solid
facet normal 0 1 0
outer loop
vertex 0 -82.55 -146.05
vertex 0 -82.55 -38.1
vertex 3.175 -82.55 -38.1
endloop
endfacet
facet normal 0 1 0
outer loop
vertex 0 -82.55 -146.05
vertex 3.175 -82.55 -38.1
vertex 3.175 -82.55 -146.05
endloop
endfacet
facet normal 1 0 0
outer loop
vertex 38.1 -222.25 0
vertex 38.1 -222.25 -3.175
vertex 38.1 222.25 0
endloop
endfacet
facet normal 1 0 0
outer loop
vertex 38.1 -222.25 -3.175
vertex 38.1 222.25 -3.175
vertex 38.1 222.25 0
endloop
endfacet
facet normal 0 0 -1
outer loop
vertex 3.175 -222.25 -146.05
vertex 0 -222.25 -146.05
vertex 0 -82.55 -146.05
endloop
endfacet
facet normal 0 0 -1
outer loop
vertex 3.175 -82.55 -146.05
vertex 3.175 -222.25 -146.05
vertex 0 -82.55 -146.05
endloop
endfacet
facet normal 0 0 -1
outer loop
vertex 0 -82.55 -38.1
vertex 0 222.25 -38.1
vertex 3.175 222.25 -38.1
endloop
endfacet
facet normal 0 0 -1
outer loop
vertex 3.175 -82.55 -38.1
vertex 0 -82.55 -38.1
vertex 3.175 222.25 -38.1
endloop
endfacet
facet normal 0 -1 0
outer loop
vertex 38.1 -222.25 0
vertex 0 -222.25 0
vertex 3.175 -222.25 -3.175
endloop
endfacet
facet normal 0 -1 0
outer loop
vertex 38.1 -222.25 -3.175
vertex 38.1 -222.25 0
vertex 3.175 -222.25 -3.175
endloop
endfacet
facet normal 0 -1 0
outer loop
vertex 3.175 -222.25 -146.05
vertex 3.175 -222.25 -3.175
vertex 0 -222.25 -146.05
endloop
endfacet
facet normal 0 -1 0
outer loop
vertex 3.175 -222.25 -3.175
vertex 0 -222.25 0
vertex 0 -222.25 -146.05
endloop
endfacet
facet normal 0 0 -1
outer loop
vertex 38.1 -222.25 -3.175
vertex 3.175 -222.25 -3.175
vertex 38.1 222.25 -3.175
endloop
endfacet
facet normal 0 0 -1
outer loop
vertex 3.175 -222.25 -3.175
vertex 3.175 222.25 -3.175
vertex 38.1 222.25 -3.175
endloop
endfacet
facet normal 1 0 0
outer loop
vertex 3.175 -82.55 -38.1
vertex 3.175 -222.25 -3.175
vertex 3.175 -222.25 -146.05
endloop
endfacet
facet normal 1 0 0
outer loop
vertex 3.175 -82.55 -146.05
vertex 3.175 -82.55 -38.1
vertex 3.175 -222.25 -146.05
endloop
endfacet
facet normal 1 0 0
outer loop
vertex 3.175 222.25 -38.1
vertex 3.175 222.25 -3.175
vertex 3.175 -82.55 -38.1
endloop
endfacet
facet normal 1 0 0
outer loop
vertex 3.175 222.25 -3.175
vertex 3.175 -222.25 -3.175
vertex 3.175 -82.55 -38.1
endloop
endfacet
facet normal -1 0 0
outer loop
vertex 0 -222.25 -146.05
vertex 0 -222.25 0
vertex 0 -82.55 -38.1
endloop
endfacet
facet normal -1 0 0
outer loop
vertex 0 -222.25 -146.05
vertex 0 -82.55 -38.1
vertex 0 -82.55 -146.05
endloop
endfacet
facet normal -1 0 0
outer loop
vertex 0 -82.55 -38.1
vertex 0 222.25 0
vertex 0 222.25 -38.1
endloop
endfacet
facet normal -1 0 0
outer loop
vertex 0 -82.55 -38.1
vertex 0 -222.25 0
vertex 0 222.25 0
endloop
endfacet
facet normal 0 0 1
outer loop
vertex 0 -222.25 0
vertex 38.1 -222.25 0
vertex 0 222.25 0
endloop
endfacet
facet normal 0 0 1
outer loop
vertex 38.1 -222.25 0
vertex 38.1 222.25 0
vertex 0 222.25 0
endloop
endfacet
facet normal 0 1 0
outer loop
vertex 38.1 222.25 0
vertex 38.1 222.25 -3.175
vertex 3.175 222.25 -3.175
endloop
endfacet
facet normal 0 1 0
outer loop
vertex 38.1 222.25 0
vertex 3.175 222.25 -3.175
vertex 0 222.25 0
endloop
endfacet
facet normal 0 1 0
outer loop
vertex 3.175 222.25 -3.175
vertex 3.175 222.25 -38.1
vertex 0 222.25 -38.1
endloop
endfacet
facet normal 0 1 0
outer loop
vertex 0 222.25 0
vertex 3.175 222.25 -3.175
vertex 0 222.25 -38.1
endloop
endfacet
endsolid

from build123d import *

# Parameters (mm, degrees)
BOSS_EXTRUDE1_DEPTH = 222.25
SKETCH19_W          = 107.95
SKETCH19_H          = 139.7
BOSS_EXTRUDE2_DEPTH = 3.175


with BuildPart() as part:
    # Sketch18 → Boss-Extrude1 (new, symmetric)
    with BuildSketch(Plane(origin=(0, 0, 0), x_dir=(1, 0, 0), z_dir=(0, 1, 0))):
        Polygon((3.175, 38.1), (3.175, 3.175), (38.1, 3.175), (38.1, 0), (0, 0), (0, 38.1), align=None)
    extrude(amount=BOSS_EXTRUDE1_DEPTH, both=True)

    # Sketch19 → Boss-Extrude2 (add)
    with BuildSketch(Plane(origin=(0, 0, 0), x_dir=(0, 0, -1), z_dir=(1, 0, 0))):
        with Locations((92.075, -152.4)):
            Rectangle(SKETCH19_W, SKETCH19_H)
    extrude(amount=BOSS_EXTRUDE2_DEPTH)


solid = part.part
